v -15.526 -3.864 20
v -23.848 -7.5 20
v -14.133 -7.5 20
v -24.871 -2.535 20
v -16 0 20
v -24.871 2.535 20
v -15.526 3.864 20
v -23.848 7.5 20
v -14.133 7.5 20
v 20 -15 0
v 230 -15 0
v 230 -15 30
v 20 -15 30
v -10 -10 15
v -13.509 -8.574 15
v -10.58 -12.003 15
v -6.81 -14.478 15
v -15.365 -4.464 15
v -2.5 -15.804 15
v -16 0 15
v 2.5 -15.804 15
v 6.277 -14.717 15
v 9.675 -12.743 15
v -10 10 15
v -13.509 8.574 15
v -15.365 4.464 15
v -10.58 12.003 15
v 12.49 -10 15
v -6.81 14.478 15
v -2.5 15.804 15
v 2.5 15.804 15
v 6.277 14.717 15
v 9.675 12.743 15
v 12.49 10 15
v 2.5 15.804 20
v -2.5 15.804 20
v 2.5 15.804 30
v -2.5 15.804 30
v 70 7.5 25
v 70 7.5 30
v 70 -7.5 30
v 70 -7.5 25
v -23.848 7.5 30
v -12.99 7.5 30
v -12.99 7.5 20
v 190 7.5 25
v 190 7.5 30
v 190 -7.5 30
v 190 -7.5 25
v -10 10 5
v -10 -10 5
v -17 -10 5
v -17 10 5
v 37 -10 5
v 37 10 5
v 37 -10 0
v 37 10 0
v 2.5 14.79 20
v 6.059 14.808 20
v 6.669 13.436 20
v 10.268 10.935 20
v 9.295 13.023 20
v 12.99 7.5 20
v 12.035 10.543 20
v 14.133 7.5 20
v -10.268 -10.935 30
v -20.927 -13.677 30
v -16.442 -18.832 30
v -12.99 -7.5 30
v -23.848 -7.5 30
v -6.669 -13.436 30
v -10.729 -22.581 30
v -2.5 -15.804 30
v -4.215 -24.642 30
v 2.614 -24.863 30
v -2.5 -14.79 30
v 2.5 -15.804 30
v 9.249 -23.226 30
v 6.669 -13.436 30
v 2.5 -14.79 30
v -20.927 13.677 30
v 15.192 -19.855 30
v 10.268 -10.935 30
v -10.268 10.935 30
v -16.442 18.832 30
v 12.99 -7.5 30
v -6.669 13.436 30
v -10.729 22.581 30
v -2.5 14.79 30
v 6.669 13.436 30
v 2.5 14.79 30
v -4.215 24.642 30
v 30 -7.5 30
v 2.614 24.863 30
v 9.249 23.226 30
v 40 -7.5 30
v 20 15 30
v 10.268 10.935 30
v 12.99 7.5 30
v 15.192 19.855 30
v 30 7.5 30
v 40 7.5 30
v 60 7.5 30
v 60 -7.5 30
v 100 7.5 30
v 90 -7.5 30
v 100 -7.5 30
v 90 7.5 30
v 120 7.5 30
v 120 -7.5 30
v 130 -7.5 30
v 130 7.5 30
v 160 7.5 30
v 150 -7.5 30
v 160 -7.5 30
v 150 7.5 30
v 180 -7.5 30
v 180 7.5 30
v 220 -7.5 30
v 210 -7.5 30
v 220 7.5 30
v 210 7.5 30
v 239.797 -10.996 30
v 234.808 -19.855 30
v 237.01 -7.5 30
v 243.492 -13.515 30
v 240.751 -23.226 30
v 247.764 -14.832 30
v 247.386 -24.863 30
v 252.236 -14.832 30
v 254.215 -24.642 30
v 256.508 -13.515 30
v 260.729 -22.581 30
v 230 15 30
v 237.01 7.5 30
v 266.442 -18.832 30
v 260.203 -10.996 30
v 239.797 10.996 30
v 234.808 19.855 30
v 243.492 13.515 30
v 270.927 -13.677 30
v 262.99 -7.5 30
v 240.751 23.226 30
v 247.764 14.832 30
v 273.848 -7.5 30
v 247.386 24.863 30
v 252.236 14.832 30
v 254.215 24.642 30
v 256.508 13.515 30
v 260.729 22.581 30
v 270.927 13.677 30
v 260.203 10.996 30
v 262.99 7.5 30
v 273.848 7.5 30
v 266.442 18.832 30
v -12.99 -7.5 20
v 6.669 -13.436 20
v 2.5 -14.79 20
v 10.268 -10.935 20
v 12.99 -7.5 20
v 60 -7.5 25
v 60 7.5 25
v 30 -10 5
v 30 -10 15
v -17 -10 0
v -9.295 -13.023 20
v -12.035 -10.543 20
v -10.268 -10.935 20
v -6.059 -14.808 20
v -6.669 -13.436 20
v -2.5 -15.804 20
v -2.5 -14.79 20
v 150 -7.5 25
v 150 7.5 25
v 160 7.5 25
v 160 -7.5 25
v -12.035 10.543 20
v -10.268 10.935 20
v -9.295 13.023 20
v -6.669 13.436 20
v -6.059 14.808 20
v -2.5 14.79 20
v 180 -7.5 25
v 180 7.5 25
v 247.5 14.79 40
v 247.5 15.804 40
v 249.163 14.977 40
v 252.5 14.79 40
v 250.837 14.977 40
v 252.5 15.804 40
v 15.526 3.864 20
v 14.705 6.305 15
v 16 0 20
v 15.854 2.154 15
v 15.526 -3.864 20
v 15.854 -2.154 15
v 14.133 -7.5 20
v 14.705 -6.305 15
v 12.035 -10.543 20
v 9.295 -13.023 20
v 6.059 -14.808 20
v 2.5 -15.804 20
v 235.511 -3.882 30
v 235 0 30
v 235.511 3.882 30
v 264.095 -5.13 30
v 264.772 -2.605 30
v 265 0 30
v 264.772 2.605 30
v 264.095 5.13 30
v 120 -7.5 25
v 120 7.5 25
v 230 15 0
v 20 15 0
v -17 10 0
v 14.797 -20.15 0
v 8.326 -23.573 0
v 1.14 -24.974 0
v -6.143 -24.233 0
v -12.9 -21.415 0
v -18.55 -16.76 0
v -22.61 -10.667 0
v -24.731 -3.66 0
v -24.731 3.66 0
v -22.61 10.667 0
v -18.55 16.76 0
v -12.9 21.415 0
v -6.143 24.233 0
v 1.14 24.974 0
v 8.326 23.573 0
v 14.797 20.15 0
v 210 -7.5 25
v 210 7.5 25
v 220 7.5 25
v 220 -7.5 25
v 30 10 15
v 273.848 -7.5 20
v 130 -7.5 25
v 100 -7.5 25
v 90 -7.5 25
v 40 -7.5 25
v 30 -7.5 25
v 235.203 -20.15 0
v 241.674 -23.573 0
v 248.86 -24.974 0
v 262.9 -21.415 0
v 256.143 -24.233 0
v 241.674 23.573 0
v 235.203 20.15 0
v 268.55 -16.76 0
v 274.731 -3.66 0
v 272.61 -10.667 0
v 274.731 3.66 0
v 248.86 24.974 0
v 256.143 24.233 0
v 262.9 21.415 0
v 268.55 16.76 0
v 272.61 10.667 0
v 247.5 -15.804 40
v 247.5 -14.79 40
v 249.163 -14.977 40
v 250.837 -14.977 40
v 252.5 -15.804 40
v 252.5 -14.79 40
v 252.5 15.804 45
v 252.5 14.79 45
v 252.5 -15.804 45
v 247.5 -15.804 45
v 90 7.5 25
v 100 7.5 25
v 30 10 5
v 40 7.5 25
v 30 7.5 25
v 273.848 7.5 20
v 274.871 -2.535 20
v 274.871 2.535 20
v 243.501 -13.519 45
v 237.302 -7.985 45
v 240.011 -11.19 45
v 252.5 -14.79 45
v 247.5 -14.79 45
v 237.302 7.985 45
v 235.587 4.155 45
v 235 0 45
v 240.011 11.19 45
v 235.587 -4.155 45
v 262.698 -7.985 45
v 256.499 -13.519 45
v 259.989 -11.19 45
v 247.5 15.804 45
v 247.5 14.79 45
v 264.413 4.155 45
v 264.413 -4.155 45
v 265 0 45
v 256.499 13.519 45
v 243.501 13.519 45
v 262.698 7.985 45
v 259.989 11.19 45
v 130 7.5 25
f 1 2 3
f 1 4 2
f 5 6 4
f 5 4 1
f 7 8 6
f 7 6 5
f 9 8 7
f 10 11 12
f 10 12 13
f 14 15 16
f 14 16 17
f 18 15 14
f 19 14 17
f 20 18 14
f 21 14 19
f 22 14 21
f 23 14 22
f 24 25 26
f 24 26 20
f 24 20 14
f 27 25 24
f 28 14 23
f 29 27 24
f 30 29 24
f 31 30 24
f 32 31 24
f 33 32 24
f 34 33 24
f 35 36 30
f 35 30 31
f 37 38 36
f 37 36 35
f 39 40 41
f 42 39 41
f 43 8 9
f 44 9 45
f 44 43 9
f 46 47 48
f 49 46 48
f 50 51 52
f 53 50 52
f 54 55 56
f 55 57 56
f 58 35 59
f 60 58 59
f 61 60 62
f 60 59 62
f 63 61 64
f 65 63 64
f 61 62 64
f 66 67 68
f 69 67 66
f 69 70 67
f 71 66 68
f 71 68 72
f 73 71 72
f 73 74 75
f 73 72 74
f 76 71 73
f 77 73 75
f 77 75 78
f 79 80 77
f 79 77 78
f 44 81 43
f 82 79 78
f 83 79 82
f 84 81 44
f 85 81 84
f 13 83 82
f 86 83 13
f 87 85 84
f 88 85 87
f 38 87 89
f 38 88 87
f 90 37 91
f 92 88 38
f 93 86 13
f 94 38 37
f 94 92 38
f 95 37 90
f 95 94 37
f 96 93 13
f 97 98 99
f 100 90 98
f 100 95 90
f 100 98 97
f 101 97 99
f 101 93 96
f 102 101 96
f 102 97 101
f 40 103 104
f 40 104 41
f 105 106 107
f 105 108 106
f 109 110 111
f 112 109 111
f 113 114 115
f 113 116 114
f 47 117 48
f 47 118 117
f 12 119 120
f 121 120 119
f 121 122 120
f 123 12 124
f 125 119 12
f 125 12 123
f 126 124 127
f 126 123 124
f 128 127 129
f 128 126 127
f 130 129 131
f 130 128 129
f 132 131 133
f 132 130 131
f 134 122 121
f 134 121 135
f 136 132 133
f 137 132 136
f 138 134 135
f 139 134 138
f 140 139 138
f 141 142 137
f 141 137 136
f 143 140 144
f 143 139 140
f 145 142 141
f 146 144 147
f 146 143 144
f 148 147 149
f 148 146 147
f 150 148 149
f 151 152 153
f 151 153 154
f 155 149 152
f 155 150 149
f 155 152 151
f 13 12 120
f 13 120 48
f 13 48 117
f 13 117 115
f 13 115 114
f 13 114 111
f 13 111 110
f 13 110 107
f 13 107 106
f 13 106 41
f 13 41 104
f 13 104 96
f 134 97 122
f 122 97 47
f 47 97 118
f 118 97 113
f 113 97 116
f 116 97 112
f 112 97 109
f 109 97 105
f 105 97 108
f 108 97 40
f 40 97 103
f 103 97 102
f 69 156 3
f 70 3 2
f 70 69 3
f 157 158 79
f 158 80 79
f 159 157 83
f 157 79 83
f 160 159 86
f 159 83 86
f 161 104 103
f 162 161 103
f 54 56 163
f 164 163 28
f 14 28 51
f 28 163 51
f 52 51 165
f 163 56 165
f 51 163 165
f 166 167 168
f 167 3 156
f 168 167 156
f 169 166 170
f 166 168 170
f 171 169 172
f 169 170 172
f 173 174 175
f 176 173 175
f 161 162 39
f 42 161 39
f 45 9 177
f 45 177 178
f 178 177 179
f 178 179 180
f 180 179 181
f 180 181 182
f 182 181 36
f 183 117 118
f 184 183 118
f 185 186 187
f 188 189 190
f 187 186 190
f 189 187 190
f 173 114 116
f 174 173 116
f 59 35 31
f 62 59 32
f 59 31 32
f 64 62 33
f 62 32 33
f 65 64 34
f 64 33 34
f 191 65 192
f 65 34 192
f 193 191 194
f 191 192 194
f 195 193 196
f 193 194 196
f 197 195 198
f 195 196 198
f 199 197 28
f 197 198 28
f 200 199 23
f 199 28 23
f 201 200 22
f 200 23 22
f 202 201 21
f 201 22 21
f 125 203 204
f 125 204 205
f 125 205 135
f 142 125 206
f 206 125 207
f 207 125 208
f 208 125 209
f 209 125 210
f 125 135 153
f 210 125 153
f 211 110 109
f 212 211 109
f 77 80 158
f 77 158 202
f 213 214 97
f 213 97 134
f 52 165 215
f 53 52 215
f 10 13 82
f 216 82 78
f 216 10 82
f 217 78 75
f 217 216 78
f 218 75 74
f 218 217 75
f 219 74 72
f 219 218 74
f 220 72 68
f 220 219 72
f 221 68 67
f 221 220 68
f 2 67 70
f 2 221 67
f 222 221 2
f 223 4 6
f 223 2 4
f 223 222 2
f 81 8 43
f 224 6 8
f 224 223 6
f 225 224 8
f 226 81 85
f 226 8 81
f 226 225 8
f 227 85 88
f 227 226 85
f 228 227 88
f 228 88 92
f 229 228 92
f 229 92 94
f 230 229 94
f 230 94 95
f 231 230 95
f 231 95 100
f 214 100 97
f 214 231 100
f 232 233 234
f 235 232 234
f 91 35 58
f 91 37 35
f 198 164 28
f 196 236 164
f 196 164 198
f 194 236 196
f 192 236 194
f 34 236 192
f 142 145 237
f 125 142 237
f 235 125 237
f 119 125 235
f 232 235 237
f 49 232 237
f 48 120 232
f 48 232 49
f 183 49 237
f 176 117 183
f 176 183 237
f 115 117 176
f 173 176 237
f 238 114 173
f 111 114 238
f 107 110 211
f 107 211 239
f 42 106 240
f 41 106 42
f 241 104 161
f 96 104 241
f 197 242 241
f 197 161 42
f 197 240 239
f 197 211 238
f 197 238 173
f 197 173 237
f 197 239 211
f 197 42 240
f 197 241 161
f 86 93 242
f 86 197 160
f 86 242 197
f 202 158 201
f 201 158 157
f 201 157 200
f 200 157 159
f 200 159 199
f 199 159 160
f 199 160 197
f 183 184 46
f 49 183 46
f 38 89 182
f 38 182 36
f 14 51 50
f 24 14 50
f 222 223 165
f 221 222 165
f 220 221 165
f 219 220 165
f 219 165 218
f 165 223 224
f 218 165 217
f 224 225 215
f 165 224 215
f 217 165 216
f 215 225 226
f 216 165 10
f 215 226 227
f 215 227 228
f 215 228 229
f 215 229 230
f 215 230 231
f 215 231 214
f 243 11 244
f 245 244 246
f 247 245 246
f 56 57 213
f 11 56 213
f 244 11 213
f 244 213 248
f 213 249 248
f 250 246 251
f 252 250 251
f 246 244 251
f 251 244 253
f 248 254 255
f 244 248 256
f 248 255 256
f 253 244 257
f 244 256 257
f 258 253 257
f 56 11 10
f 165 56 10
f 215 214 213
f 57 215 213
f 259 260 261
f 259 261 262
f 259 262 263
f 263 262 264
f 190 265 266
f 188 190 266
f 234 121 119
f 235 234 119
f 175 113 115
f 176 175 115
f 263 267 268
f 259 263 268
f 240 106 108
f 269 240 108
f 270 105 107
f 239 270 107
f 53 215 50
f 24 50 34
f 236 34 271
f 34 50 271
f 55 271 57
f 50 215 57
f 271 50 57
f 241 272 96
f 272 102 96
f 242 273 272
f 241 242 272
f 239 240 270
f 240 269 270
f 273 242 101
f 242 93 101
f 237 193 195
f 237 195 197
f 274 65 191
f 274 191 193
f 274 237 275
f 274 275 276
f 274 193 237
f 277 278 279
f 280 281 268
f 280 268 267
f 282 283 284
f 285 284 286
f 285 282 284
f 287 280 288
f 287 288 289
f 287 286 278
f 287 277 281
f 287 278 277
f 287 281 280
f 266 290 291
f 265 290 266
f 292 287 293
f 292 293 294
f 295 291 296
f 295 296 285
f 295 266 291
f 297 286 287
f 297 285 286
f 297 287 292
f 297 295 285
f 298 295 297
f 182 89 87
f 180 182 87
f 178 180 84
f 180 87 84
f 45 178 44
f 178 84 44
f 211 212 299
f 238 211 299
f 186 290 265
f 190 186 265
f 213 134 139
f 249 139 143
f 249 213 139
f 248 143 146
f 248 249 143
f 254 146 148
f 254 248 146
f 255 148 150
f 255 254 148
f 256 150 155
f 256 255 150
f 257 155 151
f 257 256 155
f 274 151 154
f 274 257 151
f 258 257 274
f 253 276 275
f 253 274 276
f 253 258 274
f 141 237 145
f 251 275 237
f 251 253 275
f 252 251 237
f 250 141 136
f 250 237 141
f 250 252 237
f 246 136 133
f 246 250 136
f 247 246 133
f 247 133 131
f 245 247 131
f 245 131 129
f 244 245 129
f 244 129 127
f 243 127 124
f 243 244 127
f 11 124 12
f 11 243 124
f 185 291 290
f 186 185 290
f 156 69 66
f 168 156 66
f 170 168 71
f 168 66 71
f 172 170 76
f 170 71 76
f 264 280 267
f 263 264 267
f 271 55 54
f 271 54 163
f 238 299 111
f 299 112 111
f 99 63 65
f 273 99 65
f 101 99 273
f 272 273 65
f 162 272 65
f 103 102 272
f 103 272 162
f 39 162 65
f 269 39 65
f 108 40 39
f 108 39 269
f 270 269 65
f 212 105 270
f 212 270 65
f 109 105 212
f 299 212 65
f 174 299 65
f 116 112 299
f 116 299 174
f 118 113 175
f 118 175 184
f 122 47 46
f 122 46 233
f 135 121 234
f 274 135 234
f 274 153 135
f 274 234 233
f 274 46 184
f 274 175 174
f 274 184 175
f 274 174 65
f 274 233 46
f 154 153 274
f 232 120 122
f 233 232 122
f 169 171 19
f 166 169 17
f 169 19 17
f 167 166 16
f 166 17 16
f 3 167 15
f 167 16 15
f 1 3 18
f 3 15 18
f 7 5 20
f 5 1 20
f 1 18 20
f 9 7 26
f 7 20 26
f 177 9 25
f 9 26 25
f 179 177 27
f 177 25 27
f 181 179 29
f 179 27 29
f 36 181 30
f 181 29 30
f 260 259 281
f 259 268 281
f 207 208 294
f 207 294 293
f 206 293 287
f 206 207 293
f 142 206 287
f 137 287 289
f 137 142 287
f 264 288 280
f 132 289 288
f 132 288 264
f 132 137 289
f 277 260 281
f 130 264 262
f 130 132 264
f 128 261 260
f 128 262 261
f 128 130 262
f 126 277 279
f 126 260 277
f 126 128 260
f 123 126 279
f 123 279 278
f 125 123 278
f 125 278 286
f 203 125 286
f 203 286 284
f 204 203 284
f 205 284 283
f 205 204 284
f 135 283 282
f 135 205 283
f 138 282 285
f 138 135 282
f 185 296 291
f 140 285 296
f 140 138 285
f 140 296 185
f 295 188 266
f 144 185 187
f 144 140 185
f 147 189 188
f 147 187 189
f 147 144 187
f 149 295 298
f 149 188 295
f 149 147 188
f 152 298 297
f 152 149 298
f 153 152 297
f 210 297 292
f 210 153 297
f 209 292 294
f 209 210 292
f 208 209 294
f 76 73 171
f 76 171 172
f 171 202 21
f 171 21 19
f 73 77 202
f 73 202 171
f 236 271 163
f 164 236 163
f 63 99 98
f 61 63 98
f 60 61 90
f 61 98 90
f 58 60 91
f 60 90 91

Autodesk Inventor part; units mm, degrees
ref_plane "YZ Plane" through (0, 0, 0) normal (1, 0, 0) x (0, 1, 0)
ref_plane "XZ Plane" through (0, 0, 0) normal (0, 1, 0) x (-1, 0, 0)
ref_plane "XY Plane" through (0, 0, 0) normal (0, 0, 1) x (1, 0, 0)
sketch "Szkic1" plane through (0, 0, 0) normal (0, 0, 1) x (1, 0, 0)
  arc A0 (20, 15) -> (-20, 15) centre (0, 0) ccw
  line L0 (20, 15) -> (125, 15)
  line L1 (125, 15) -> (125, -15)
  line L2 (125, -15) -> (20, -15)
  arc A1 (230, -15) -> (230, 15) centre (250, 0) ccw
  line L3 (230, 15) -> (125, 15)
  line L4 (125, -15) -> (230, -15)
  arc A2 (-20, 15) -> (20, -15) centre (0, 0) ccw
  dimension "d0" = 50
  dimension "d1" = 30
  dimension "d2" = 250
extrude "kształt" add sketch "Szkic1" along normal blind 30
sketch "Szkic2" plane through (0, 0, 30) normal (0, 0, 1) x (1, 0, 0)
  arc A0 (20, 15) -> (20, -15) centre (0, 0) ccw projected
  line L0 (20, -15) -> (230, -15) projected
  arc A1 (230, -15) -> (230, 15) centre (250, 0) ccw projected
  line L1 (230, 15) -> (20, 15) projected
  line L2 (-23.8485, 7.5) -> (273.8485, 7.5)
  line L3 (273.8485, -7.5) -> (-23.8485, -7.5)
  point P0 (-23.8485, -7.5)
  dimension "d5" = 15
extrude "rowek na kable" cut sketch "Szkic2" against normal blind 10 contours L2 A1 L3 A0
sketch "Szkic3" plane through (0, 0, 30) normal (0, 0, 1) x (1, 0, 0)
  arc A0 (273.8485, 7.5) -> (230, 15) centre (250, 0) ccw projected
  circle A1 centre (250, 0) radius 15
  point P0 (0, 0)
  dimension "d8" = 30
extrude "odstająćy cosik" add sketch "Szkic3" along normal blind 15
sketch "Szkic4" plane through (0, 0, 30) normal (0, 0, 1) x (1, 0, 0)
  circle A0 centre (0, 0) radius 15
  dimension "d11" = 30
extrude "wgłebiający cosik" cut sketch "Szkic4" against normal blind 15
sketch "Szkic5" plane through (0, 0, 30) normal (0, 0, 1) x (1, 0, 0)
  arc A0 (12.9904, 7.5) -> (-12.9904, 7.5) centre (0, 0) ccw projected
  line L0 (12.9904, 7.5) -> (237.0096, 7.5) projected
  arc A1 (262.9904, 7.5) -> (237.0096, 7.5) centre (250, 0) ccw projected
  line L1 (262.9904, 7.5) -> (273.8485, 7.5) projected
  arc A2 (273.8485, 7.5) -> (230, 15) centre (250, 0) ccw projected
  line L2 (230, 15) -> (20, 15) projected
  arc A3 (20, 15) -> (-23.8485, 7.5) centre (0, 0) ccw projected
  line L3 (-23.8485, 7.5) -> (-12.9904, 7.5) projected
  arc A4 (-12.9904, -7.5) -> (12.9904, -7.5) centre (0, 0) ccw projected
  line L4 (-12.9904, -7.5) -> (-23.8485, -7.5) projected
  arc A5 (-23.8485, -7.5) -> (20, -15) centre (0, 0) ccw projected
  line L5 (20, -15) -> (230, -15) projected
  arc A6 (230, -15) -> (273.8485, -7.5) centre (250, 0) ccw projected
  line L6 (273.8485, -7.5) -> (262.9904, -7.5) projected
  arc A7 (237.0096, -7.5) -> (262.9904, -7.5) centre (250, 0) ccw projected
  line L7 (237.0096, -7.5) -> (12.9904, -7.5) projected
  line L8 (30, 7.5) -> (40, 7.5)
  line L9 (40, 7.5) -> (40, -7.5)
  line L10 (40, -7.5) -> (30, -7.5)
  line L11 (30, -7.5) -> (30, 7.5)
  arc A8 (-23.8485, -7.5) -> (20, -15) centre (0, 0) ccw projected
  line L12 (60, -7.5) -> (60, 7.5)
  line L13 (70, 7.5) -> (70, -7.5)
  line L14 (70, -7.5) -> (60, -7.5)
  line L15 (60, 7.5) -> (70, 7.5)
  line L16 (90, -7.5) -> (90, 7.5)
  line L17 (100, 7.5) -> (100, -7.5)
  line L18 (100, -7.5) -> (90, -7.5)
  line L19 (90, 7.5) -> (100, 7.5)
  line L20 (120, -7.5) -> (120, 7.5)
  line L21 (130, 7.5) -> (130, -7.5)
  line L22 (130, -7.5) -> (120, -7.5)
  line L23 (120, 7.5) -> (130, 7.5)
  line L24 (150, -7.5) -> (150, 7.5)
  line L25 (160, 7.5) -> (160, -7.5)
  line L26 (160, -7.5) -> (150, -7.5)
  line L27 (150, 7.5) -> (160, 7.5)
  line L28 (180, -7.5) -> (180, 7.5)
  line L29 (190, 7.5) -> (190, -7.5)
  line L30 (190, -7.5) -> (180, -7.5)
  line L31 (180, 7.5) -> (190, 7.5)
  line L32 (210, -7.5) -> (210, 7.5)
  line L33 (220, 7.5) -> (220, -7.5)
  line L34 (220, -7.5) -> (210, -7.5)
  line L35 (210, 7.5) -> (220, 7.5)
  arc A9 (273.8485, 7.5) -> (230, 15) centre (250, 0) ccw projected
  line L36 (0, 0) -> (125, 0) construction
  line L37 (125, -7.5) -> (125, 7.5) construction
  line L38 (125, 0) -> (250, 0) construction
  point P0 (70, -7.5)
  point P1 (60, 7.5)
  point P2 (220, -7.5)
  point P3 (210, 7.5)
  point P4 (190, -7.5)
  point P5 (180, 7.5)
  point P6 (160, -7.5)
  point P7 (150, 7.5)
  point P8 (130, -7.5)
  point P9 (120, 7.5)
  point P10 (100, -7.5)
  point P11 (90, 7.5)
  dimension "d15" = 10
  dimension "d18" = 30
extrude "wzmocnienie" add sketch "Szkic5" against normal blind 5 contours L0 L9 L7 L11 | L0 L13 L7 L12 | L0 L17 L7 L16 | L0 L21 L7 L20 | L33 L7 L32 L0 | L0 L25 L7 L24 | L29 L7 L28 L0
sketch "Szkic6" plane through (250, 0, 45) normal (0, 0, 1) x (1, 0, 0)
  circle A0 centre (0, 0) radius 15 projected
  arc A1 (2.5, 15.8035) -> (2.5, -15.8035) centre (0, 0) ccw construction
  line L0 (-2.5, 15.8035) -> (2.5, 15.8035)
  line L1 (2.5, 15.8035) -> (2.5, 14.7902)
  line L2 (2.5, -15.8035) -> (-2.5, -15.8035)
  line L3 (-2.5, -15.8035) -> (-2.5, -14.7902)
  line L4 (2.5, 14.7902) -> (2.5, -14.7902) construction
  line L5 (-2.5, 14.7902) -> (-2.5, 15.8035)
  line L6 (-2.5, -14.7902) -> (-2.5, 14.7902) construction
  line L7 (2.5, -14.7902) -> (2.5, -15.8035)
  point P0 (-250, 0)
  dimension "d25" = 32
  dimension "d27" = 5
extrude "złobek" add sketch "Szkic6" against normal blind 5 contours A0 L5 L0 L1 | L7 L2 L3 A0
sketch "Szkic7" plane through (0, 0, 30) normal (0, 0, 1) x (1, 0, 0)
  circle A0 centre (0, 0) radius 16 construction
  line L0 (-2.5, 15.8035) -> (2.5, 15.8035)
  line L1 (2.5, -15.8035) -> (-2.5, -15.8035)
  arc A1 (12.9904, 7.5) -> (-12.9904, 7.5) centre (0, 0) ccw projected
  arc A2 (-12.9904, -7.5) -> (12.9904, -7.5) centre (0, 0) ccw projected
  line L2 (2.5, 15.8035) -> (2.5, 14.7902)
  line L3 (2.5, -14.7902) -> (2.5, -15.8035)
  line L4 (-2.5, -15.8035) -> (-2.5, -14.7902)
  line L5 (-2.5, 14.7902) -> (-2.5, 15.8035)
  arc A3 (2.5, 14.7902) -> (-2.5, 14.7902) centre (0, 0) ccw
  arc A4 (-2.5, -14.7902) -> (2.5, -14.7902) centre (0, 0) ccw
  point P0 (2.5, 15.2968)
  dimension "d30" = 32
  dimension "d32" = 5
extrude "wklęsły żłobek" cut sketch "Szkic7" against normal up to surface (15 mm away)
sketch "Szkic8" plane through (0, 0, 15) normal (0, 0, 1) x (1, 0, 0)
  arc A0 (2.5, -14.7902) -> (2.5, 14.7902) centre (0, 0) ccw projected
  line L0 (2.5, 15.8035) -> (2.5, 14.7902) projected
  line L1 (-2.5, 15.8035) -> (2.5, 15.8035) projected
  line L2 (-2.5, 14.7902) -> (-2.5, 15.8035) projected
  arc A1 (-2.5, 14.7902) -> (-2.5, -14.7902) centre (0, 0) ccw projected
  line L3 (-2.5, -15.8035) -> (-2.5, -14.7902) projected
  line L4 (2.5, -15.8035) -> (-2.5, -15.8035) projected
  line L5 (2.5, -14.7902) -> (2.5, -15.8035) projected
  circle A2 centre (0, 0) radius 16
  circle A3 centre (0, 0) radius 15
extrude "rowek" cut sketch "Szkic8" along normal blind 5 contours A0 L0 A2 L5 | L3 A2 L2 A1
sketch "Szkic10" plane through (0, 0, 0) normal (0, 0, -1) x (-1, 0, 0)
  line L0 (10, 10) -> (-30, 10)
  line L1 (-30, 10) -> (-30, -10)
  line L2 (-30, -10) -> (10, -10)
  line L3 (10, -10) -> (10, 10)
  circle A0 centre (0, 0) radius 10 construction
  line L4 (17, 10) -> (-37, 10)
  line L5 (-37, 10) -> (-37, -10)
  line L6 (-37, -10) -> (-30, -10)
  line L7 (17, -10) -> (17, 10)
  line L8 (10, -10) -> (17, -10)
  line L9 (-30, -10) -> (10, -10)
  circle A1 centre (14.5, -5) radius 2.5
  circle A2 centre (14.5, 5) radius 2.5
  line L10 (-10, -10) -> (-10, 10) construction
  circle A3 centre (-34.5, -5) radius 2.5
  circle A4 centre (-34.5, 5) radius 2.5
  point P0 (17, 0)
  point P1 (17, -5)
  point P2 (17, 5)
  point P3 (-37, 5)
  point P4 (-37, -5)
  dimension "d40" = 40
  dimension "d41" = 20
  dimension "d42" = 54
  dimension "d43" = 5
  dimension "d44" = 5
  dimension "d45" = 5
  dimension "d46" = 5
extrude "Wyciągnięcie proste9" cut sketch "Szkic10" against normal blind 15 contours L3 L2 L1 L0
extrude "Wyciągnięcie proste11" cut sketch "Szkic10" against normal blind 5 contours A1 | A2 | L4 L7 L8 L3 | A4 | A3 | L1 L6 L5 L4
properties part number "1stopien" material "Tworzywo sztuczne ABS"
